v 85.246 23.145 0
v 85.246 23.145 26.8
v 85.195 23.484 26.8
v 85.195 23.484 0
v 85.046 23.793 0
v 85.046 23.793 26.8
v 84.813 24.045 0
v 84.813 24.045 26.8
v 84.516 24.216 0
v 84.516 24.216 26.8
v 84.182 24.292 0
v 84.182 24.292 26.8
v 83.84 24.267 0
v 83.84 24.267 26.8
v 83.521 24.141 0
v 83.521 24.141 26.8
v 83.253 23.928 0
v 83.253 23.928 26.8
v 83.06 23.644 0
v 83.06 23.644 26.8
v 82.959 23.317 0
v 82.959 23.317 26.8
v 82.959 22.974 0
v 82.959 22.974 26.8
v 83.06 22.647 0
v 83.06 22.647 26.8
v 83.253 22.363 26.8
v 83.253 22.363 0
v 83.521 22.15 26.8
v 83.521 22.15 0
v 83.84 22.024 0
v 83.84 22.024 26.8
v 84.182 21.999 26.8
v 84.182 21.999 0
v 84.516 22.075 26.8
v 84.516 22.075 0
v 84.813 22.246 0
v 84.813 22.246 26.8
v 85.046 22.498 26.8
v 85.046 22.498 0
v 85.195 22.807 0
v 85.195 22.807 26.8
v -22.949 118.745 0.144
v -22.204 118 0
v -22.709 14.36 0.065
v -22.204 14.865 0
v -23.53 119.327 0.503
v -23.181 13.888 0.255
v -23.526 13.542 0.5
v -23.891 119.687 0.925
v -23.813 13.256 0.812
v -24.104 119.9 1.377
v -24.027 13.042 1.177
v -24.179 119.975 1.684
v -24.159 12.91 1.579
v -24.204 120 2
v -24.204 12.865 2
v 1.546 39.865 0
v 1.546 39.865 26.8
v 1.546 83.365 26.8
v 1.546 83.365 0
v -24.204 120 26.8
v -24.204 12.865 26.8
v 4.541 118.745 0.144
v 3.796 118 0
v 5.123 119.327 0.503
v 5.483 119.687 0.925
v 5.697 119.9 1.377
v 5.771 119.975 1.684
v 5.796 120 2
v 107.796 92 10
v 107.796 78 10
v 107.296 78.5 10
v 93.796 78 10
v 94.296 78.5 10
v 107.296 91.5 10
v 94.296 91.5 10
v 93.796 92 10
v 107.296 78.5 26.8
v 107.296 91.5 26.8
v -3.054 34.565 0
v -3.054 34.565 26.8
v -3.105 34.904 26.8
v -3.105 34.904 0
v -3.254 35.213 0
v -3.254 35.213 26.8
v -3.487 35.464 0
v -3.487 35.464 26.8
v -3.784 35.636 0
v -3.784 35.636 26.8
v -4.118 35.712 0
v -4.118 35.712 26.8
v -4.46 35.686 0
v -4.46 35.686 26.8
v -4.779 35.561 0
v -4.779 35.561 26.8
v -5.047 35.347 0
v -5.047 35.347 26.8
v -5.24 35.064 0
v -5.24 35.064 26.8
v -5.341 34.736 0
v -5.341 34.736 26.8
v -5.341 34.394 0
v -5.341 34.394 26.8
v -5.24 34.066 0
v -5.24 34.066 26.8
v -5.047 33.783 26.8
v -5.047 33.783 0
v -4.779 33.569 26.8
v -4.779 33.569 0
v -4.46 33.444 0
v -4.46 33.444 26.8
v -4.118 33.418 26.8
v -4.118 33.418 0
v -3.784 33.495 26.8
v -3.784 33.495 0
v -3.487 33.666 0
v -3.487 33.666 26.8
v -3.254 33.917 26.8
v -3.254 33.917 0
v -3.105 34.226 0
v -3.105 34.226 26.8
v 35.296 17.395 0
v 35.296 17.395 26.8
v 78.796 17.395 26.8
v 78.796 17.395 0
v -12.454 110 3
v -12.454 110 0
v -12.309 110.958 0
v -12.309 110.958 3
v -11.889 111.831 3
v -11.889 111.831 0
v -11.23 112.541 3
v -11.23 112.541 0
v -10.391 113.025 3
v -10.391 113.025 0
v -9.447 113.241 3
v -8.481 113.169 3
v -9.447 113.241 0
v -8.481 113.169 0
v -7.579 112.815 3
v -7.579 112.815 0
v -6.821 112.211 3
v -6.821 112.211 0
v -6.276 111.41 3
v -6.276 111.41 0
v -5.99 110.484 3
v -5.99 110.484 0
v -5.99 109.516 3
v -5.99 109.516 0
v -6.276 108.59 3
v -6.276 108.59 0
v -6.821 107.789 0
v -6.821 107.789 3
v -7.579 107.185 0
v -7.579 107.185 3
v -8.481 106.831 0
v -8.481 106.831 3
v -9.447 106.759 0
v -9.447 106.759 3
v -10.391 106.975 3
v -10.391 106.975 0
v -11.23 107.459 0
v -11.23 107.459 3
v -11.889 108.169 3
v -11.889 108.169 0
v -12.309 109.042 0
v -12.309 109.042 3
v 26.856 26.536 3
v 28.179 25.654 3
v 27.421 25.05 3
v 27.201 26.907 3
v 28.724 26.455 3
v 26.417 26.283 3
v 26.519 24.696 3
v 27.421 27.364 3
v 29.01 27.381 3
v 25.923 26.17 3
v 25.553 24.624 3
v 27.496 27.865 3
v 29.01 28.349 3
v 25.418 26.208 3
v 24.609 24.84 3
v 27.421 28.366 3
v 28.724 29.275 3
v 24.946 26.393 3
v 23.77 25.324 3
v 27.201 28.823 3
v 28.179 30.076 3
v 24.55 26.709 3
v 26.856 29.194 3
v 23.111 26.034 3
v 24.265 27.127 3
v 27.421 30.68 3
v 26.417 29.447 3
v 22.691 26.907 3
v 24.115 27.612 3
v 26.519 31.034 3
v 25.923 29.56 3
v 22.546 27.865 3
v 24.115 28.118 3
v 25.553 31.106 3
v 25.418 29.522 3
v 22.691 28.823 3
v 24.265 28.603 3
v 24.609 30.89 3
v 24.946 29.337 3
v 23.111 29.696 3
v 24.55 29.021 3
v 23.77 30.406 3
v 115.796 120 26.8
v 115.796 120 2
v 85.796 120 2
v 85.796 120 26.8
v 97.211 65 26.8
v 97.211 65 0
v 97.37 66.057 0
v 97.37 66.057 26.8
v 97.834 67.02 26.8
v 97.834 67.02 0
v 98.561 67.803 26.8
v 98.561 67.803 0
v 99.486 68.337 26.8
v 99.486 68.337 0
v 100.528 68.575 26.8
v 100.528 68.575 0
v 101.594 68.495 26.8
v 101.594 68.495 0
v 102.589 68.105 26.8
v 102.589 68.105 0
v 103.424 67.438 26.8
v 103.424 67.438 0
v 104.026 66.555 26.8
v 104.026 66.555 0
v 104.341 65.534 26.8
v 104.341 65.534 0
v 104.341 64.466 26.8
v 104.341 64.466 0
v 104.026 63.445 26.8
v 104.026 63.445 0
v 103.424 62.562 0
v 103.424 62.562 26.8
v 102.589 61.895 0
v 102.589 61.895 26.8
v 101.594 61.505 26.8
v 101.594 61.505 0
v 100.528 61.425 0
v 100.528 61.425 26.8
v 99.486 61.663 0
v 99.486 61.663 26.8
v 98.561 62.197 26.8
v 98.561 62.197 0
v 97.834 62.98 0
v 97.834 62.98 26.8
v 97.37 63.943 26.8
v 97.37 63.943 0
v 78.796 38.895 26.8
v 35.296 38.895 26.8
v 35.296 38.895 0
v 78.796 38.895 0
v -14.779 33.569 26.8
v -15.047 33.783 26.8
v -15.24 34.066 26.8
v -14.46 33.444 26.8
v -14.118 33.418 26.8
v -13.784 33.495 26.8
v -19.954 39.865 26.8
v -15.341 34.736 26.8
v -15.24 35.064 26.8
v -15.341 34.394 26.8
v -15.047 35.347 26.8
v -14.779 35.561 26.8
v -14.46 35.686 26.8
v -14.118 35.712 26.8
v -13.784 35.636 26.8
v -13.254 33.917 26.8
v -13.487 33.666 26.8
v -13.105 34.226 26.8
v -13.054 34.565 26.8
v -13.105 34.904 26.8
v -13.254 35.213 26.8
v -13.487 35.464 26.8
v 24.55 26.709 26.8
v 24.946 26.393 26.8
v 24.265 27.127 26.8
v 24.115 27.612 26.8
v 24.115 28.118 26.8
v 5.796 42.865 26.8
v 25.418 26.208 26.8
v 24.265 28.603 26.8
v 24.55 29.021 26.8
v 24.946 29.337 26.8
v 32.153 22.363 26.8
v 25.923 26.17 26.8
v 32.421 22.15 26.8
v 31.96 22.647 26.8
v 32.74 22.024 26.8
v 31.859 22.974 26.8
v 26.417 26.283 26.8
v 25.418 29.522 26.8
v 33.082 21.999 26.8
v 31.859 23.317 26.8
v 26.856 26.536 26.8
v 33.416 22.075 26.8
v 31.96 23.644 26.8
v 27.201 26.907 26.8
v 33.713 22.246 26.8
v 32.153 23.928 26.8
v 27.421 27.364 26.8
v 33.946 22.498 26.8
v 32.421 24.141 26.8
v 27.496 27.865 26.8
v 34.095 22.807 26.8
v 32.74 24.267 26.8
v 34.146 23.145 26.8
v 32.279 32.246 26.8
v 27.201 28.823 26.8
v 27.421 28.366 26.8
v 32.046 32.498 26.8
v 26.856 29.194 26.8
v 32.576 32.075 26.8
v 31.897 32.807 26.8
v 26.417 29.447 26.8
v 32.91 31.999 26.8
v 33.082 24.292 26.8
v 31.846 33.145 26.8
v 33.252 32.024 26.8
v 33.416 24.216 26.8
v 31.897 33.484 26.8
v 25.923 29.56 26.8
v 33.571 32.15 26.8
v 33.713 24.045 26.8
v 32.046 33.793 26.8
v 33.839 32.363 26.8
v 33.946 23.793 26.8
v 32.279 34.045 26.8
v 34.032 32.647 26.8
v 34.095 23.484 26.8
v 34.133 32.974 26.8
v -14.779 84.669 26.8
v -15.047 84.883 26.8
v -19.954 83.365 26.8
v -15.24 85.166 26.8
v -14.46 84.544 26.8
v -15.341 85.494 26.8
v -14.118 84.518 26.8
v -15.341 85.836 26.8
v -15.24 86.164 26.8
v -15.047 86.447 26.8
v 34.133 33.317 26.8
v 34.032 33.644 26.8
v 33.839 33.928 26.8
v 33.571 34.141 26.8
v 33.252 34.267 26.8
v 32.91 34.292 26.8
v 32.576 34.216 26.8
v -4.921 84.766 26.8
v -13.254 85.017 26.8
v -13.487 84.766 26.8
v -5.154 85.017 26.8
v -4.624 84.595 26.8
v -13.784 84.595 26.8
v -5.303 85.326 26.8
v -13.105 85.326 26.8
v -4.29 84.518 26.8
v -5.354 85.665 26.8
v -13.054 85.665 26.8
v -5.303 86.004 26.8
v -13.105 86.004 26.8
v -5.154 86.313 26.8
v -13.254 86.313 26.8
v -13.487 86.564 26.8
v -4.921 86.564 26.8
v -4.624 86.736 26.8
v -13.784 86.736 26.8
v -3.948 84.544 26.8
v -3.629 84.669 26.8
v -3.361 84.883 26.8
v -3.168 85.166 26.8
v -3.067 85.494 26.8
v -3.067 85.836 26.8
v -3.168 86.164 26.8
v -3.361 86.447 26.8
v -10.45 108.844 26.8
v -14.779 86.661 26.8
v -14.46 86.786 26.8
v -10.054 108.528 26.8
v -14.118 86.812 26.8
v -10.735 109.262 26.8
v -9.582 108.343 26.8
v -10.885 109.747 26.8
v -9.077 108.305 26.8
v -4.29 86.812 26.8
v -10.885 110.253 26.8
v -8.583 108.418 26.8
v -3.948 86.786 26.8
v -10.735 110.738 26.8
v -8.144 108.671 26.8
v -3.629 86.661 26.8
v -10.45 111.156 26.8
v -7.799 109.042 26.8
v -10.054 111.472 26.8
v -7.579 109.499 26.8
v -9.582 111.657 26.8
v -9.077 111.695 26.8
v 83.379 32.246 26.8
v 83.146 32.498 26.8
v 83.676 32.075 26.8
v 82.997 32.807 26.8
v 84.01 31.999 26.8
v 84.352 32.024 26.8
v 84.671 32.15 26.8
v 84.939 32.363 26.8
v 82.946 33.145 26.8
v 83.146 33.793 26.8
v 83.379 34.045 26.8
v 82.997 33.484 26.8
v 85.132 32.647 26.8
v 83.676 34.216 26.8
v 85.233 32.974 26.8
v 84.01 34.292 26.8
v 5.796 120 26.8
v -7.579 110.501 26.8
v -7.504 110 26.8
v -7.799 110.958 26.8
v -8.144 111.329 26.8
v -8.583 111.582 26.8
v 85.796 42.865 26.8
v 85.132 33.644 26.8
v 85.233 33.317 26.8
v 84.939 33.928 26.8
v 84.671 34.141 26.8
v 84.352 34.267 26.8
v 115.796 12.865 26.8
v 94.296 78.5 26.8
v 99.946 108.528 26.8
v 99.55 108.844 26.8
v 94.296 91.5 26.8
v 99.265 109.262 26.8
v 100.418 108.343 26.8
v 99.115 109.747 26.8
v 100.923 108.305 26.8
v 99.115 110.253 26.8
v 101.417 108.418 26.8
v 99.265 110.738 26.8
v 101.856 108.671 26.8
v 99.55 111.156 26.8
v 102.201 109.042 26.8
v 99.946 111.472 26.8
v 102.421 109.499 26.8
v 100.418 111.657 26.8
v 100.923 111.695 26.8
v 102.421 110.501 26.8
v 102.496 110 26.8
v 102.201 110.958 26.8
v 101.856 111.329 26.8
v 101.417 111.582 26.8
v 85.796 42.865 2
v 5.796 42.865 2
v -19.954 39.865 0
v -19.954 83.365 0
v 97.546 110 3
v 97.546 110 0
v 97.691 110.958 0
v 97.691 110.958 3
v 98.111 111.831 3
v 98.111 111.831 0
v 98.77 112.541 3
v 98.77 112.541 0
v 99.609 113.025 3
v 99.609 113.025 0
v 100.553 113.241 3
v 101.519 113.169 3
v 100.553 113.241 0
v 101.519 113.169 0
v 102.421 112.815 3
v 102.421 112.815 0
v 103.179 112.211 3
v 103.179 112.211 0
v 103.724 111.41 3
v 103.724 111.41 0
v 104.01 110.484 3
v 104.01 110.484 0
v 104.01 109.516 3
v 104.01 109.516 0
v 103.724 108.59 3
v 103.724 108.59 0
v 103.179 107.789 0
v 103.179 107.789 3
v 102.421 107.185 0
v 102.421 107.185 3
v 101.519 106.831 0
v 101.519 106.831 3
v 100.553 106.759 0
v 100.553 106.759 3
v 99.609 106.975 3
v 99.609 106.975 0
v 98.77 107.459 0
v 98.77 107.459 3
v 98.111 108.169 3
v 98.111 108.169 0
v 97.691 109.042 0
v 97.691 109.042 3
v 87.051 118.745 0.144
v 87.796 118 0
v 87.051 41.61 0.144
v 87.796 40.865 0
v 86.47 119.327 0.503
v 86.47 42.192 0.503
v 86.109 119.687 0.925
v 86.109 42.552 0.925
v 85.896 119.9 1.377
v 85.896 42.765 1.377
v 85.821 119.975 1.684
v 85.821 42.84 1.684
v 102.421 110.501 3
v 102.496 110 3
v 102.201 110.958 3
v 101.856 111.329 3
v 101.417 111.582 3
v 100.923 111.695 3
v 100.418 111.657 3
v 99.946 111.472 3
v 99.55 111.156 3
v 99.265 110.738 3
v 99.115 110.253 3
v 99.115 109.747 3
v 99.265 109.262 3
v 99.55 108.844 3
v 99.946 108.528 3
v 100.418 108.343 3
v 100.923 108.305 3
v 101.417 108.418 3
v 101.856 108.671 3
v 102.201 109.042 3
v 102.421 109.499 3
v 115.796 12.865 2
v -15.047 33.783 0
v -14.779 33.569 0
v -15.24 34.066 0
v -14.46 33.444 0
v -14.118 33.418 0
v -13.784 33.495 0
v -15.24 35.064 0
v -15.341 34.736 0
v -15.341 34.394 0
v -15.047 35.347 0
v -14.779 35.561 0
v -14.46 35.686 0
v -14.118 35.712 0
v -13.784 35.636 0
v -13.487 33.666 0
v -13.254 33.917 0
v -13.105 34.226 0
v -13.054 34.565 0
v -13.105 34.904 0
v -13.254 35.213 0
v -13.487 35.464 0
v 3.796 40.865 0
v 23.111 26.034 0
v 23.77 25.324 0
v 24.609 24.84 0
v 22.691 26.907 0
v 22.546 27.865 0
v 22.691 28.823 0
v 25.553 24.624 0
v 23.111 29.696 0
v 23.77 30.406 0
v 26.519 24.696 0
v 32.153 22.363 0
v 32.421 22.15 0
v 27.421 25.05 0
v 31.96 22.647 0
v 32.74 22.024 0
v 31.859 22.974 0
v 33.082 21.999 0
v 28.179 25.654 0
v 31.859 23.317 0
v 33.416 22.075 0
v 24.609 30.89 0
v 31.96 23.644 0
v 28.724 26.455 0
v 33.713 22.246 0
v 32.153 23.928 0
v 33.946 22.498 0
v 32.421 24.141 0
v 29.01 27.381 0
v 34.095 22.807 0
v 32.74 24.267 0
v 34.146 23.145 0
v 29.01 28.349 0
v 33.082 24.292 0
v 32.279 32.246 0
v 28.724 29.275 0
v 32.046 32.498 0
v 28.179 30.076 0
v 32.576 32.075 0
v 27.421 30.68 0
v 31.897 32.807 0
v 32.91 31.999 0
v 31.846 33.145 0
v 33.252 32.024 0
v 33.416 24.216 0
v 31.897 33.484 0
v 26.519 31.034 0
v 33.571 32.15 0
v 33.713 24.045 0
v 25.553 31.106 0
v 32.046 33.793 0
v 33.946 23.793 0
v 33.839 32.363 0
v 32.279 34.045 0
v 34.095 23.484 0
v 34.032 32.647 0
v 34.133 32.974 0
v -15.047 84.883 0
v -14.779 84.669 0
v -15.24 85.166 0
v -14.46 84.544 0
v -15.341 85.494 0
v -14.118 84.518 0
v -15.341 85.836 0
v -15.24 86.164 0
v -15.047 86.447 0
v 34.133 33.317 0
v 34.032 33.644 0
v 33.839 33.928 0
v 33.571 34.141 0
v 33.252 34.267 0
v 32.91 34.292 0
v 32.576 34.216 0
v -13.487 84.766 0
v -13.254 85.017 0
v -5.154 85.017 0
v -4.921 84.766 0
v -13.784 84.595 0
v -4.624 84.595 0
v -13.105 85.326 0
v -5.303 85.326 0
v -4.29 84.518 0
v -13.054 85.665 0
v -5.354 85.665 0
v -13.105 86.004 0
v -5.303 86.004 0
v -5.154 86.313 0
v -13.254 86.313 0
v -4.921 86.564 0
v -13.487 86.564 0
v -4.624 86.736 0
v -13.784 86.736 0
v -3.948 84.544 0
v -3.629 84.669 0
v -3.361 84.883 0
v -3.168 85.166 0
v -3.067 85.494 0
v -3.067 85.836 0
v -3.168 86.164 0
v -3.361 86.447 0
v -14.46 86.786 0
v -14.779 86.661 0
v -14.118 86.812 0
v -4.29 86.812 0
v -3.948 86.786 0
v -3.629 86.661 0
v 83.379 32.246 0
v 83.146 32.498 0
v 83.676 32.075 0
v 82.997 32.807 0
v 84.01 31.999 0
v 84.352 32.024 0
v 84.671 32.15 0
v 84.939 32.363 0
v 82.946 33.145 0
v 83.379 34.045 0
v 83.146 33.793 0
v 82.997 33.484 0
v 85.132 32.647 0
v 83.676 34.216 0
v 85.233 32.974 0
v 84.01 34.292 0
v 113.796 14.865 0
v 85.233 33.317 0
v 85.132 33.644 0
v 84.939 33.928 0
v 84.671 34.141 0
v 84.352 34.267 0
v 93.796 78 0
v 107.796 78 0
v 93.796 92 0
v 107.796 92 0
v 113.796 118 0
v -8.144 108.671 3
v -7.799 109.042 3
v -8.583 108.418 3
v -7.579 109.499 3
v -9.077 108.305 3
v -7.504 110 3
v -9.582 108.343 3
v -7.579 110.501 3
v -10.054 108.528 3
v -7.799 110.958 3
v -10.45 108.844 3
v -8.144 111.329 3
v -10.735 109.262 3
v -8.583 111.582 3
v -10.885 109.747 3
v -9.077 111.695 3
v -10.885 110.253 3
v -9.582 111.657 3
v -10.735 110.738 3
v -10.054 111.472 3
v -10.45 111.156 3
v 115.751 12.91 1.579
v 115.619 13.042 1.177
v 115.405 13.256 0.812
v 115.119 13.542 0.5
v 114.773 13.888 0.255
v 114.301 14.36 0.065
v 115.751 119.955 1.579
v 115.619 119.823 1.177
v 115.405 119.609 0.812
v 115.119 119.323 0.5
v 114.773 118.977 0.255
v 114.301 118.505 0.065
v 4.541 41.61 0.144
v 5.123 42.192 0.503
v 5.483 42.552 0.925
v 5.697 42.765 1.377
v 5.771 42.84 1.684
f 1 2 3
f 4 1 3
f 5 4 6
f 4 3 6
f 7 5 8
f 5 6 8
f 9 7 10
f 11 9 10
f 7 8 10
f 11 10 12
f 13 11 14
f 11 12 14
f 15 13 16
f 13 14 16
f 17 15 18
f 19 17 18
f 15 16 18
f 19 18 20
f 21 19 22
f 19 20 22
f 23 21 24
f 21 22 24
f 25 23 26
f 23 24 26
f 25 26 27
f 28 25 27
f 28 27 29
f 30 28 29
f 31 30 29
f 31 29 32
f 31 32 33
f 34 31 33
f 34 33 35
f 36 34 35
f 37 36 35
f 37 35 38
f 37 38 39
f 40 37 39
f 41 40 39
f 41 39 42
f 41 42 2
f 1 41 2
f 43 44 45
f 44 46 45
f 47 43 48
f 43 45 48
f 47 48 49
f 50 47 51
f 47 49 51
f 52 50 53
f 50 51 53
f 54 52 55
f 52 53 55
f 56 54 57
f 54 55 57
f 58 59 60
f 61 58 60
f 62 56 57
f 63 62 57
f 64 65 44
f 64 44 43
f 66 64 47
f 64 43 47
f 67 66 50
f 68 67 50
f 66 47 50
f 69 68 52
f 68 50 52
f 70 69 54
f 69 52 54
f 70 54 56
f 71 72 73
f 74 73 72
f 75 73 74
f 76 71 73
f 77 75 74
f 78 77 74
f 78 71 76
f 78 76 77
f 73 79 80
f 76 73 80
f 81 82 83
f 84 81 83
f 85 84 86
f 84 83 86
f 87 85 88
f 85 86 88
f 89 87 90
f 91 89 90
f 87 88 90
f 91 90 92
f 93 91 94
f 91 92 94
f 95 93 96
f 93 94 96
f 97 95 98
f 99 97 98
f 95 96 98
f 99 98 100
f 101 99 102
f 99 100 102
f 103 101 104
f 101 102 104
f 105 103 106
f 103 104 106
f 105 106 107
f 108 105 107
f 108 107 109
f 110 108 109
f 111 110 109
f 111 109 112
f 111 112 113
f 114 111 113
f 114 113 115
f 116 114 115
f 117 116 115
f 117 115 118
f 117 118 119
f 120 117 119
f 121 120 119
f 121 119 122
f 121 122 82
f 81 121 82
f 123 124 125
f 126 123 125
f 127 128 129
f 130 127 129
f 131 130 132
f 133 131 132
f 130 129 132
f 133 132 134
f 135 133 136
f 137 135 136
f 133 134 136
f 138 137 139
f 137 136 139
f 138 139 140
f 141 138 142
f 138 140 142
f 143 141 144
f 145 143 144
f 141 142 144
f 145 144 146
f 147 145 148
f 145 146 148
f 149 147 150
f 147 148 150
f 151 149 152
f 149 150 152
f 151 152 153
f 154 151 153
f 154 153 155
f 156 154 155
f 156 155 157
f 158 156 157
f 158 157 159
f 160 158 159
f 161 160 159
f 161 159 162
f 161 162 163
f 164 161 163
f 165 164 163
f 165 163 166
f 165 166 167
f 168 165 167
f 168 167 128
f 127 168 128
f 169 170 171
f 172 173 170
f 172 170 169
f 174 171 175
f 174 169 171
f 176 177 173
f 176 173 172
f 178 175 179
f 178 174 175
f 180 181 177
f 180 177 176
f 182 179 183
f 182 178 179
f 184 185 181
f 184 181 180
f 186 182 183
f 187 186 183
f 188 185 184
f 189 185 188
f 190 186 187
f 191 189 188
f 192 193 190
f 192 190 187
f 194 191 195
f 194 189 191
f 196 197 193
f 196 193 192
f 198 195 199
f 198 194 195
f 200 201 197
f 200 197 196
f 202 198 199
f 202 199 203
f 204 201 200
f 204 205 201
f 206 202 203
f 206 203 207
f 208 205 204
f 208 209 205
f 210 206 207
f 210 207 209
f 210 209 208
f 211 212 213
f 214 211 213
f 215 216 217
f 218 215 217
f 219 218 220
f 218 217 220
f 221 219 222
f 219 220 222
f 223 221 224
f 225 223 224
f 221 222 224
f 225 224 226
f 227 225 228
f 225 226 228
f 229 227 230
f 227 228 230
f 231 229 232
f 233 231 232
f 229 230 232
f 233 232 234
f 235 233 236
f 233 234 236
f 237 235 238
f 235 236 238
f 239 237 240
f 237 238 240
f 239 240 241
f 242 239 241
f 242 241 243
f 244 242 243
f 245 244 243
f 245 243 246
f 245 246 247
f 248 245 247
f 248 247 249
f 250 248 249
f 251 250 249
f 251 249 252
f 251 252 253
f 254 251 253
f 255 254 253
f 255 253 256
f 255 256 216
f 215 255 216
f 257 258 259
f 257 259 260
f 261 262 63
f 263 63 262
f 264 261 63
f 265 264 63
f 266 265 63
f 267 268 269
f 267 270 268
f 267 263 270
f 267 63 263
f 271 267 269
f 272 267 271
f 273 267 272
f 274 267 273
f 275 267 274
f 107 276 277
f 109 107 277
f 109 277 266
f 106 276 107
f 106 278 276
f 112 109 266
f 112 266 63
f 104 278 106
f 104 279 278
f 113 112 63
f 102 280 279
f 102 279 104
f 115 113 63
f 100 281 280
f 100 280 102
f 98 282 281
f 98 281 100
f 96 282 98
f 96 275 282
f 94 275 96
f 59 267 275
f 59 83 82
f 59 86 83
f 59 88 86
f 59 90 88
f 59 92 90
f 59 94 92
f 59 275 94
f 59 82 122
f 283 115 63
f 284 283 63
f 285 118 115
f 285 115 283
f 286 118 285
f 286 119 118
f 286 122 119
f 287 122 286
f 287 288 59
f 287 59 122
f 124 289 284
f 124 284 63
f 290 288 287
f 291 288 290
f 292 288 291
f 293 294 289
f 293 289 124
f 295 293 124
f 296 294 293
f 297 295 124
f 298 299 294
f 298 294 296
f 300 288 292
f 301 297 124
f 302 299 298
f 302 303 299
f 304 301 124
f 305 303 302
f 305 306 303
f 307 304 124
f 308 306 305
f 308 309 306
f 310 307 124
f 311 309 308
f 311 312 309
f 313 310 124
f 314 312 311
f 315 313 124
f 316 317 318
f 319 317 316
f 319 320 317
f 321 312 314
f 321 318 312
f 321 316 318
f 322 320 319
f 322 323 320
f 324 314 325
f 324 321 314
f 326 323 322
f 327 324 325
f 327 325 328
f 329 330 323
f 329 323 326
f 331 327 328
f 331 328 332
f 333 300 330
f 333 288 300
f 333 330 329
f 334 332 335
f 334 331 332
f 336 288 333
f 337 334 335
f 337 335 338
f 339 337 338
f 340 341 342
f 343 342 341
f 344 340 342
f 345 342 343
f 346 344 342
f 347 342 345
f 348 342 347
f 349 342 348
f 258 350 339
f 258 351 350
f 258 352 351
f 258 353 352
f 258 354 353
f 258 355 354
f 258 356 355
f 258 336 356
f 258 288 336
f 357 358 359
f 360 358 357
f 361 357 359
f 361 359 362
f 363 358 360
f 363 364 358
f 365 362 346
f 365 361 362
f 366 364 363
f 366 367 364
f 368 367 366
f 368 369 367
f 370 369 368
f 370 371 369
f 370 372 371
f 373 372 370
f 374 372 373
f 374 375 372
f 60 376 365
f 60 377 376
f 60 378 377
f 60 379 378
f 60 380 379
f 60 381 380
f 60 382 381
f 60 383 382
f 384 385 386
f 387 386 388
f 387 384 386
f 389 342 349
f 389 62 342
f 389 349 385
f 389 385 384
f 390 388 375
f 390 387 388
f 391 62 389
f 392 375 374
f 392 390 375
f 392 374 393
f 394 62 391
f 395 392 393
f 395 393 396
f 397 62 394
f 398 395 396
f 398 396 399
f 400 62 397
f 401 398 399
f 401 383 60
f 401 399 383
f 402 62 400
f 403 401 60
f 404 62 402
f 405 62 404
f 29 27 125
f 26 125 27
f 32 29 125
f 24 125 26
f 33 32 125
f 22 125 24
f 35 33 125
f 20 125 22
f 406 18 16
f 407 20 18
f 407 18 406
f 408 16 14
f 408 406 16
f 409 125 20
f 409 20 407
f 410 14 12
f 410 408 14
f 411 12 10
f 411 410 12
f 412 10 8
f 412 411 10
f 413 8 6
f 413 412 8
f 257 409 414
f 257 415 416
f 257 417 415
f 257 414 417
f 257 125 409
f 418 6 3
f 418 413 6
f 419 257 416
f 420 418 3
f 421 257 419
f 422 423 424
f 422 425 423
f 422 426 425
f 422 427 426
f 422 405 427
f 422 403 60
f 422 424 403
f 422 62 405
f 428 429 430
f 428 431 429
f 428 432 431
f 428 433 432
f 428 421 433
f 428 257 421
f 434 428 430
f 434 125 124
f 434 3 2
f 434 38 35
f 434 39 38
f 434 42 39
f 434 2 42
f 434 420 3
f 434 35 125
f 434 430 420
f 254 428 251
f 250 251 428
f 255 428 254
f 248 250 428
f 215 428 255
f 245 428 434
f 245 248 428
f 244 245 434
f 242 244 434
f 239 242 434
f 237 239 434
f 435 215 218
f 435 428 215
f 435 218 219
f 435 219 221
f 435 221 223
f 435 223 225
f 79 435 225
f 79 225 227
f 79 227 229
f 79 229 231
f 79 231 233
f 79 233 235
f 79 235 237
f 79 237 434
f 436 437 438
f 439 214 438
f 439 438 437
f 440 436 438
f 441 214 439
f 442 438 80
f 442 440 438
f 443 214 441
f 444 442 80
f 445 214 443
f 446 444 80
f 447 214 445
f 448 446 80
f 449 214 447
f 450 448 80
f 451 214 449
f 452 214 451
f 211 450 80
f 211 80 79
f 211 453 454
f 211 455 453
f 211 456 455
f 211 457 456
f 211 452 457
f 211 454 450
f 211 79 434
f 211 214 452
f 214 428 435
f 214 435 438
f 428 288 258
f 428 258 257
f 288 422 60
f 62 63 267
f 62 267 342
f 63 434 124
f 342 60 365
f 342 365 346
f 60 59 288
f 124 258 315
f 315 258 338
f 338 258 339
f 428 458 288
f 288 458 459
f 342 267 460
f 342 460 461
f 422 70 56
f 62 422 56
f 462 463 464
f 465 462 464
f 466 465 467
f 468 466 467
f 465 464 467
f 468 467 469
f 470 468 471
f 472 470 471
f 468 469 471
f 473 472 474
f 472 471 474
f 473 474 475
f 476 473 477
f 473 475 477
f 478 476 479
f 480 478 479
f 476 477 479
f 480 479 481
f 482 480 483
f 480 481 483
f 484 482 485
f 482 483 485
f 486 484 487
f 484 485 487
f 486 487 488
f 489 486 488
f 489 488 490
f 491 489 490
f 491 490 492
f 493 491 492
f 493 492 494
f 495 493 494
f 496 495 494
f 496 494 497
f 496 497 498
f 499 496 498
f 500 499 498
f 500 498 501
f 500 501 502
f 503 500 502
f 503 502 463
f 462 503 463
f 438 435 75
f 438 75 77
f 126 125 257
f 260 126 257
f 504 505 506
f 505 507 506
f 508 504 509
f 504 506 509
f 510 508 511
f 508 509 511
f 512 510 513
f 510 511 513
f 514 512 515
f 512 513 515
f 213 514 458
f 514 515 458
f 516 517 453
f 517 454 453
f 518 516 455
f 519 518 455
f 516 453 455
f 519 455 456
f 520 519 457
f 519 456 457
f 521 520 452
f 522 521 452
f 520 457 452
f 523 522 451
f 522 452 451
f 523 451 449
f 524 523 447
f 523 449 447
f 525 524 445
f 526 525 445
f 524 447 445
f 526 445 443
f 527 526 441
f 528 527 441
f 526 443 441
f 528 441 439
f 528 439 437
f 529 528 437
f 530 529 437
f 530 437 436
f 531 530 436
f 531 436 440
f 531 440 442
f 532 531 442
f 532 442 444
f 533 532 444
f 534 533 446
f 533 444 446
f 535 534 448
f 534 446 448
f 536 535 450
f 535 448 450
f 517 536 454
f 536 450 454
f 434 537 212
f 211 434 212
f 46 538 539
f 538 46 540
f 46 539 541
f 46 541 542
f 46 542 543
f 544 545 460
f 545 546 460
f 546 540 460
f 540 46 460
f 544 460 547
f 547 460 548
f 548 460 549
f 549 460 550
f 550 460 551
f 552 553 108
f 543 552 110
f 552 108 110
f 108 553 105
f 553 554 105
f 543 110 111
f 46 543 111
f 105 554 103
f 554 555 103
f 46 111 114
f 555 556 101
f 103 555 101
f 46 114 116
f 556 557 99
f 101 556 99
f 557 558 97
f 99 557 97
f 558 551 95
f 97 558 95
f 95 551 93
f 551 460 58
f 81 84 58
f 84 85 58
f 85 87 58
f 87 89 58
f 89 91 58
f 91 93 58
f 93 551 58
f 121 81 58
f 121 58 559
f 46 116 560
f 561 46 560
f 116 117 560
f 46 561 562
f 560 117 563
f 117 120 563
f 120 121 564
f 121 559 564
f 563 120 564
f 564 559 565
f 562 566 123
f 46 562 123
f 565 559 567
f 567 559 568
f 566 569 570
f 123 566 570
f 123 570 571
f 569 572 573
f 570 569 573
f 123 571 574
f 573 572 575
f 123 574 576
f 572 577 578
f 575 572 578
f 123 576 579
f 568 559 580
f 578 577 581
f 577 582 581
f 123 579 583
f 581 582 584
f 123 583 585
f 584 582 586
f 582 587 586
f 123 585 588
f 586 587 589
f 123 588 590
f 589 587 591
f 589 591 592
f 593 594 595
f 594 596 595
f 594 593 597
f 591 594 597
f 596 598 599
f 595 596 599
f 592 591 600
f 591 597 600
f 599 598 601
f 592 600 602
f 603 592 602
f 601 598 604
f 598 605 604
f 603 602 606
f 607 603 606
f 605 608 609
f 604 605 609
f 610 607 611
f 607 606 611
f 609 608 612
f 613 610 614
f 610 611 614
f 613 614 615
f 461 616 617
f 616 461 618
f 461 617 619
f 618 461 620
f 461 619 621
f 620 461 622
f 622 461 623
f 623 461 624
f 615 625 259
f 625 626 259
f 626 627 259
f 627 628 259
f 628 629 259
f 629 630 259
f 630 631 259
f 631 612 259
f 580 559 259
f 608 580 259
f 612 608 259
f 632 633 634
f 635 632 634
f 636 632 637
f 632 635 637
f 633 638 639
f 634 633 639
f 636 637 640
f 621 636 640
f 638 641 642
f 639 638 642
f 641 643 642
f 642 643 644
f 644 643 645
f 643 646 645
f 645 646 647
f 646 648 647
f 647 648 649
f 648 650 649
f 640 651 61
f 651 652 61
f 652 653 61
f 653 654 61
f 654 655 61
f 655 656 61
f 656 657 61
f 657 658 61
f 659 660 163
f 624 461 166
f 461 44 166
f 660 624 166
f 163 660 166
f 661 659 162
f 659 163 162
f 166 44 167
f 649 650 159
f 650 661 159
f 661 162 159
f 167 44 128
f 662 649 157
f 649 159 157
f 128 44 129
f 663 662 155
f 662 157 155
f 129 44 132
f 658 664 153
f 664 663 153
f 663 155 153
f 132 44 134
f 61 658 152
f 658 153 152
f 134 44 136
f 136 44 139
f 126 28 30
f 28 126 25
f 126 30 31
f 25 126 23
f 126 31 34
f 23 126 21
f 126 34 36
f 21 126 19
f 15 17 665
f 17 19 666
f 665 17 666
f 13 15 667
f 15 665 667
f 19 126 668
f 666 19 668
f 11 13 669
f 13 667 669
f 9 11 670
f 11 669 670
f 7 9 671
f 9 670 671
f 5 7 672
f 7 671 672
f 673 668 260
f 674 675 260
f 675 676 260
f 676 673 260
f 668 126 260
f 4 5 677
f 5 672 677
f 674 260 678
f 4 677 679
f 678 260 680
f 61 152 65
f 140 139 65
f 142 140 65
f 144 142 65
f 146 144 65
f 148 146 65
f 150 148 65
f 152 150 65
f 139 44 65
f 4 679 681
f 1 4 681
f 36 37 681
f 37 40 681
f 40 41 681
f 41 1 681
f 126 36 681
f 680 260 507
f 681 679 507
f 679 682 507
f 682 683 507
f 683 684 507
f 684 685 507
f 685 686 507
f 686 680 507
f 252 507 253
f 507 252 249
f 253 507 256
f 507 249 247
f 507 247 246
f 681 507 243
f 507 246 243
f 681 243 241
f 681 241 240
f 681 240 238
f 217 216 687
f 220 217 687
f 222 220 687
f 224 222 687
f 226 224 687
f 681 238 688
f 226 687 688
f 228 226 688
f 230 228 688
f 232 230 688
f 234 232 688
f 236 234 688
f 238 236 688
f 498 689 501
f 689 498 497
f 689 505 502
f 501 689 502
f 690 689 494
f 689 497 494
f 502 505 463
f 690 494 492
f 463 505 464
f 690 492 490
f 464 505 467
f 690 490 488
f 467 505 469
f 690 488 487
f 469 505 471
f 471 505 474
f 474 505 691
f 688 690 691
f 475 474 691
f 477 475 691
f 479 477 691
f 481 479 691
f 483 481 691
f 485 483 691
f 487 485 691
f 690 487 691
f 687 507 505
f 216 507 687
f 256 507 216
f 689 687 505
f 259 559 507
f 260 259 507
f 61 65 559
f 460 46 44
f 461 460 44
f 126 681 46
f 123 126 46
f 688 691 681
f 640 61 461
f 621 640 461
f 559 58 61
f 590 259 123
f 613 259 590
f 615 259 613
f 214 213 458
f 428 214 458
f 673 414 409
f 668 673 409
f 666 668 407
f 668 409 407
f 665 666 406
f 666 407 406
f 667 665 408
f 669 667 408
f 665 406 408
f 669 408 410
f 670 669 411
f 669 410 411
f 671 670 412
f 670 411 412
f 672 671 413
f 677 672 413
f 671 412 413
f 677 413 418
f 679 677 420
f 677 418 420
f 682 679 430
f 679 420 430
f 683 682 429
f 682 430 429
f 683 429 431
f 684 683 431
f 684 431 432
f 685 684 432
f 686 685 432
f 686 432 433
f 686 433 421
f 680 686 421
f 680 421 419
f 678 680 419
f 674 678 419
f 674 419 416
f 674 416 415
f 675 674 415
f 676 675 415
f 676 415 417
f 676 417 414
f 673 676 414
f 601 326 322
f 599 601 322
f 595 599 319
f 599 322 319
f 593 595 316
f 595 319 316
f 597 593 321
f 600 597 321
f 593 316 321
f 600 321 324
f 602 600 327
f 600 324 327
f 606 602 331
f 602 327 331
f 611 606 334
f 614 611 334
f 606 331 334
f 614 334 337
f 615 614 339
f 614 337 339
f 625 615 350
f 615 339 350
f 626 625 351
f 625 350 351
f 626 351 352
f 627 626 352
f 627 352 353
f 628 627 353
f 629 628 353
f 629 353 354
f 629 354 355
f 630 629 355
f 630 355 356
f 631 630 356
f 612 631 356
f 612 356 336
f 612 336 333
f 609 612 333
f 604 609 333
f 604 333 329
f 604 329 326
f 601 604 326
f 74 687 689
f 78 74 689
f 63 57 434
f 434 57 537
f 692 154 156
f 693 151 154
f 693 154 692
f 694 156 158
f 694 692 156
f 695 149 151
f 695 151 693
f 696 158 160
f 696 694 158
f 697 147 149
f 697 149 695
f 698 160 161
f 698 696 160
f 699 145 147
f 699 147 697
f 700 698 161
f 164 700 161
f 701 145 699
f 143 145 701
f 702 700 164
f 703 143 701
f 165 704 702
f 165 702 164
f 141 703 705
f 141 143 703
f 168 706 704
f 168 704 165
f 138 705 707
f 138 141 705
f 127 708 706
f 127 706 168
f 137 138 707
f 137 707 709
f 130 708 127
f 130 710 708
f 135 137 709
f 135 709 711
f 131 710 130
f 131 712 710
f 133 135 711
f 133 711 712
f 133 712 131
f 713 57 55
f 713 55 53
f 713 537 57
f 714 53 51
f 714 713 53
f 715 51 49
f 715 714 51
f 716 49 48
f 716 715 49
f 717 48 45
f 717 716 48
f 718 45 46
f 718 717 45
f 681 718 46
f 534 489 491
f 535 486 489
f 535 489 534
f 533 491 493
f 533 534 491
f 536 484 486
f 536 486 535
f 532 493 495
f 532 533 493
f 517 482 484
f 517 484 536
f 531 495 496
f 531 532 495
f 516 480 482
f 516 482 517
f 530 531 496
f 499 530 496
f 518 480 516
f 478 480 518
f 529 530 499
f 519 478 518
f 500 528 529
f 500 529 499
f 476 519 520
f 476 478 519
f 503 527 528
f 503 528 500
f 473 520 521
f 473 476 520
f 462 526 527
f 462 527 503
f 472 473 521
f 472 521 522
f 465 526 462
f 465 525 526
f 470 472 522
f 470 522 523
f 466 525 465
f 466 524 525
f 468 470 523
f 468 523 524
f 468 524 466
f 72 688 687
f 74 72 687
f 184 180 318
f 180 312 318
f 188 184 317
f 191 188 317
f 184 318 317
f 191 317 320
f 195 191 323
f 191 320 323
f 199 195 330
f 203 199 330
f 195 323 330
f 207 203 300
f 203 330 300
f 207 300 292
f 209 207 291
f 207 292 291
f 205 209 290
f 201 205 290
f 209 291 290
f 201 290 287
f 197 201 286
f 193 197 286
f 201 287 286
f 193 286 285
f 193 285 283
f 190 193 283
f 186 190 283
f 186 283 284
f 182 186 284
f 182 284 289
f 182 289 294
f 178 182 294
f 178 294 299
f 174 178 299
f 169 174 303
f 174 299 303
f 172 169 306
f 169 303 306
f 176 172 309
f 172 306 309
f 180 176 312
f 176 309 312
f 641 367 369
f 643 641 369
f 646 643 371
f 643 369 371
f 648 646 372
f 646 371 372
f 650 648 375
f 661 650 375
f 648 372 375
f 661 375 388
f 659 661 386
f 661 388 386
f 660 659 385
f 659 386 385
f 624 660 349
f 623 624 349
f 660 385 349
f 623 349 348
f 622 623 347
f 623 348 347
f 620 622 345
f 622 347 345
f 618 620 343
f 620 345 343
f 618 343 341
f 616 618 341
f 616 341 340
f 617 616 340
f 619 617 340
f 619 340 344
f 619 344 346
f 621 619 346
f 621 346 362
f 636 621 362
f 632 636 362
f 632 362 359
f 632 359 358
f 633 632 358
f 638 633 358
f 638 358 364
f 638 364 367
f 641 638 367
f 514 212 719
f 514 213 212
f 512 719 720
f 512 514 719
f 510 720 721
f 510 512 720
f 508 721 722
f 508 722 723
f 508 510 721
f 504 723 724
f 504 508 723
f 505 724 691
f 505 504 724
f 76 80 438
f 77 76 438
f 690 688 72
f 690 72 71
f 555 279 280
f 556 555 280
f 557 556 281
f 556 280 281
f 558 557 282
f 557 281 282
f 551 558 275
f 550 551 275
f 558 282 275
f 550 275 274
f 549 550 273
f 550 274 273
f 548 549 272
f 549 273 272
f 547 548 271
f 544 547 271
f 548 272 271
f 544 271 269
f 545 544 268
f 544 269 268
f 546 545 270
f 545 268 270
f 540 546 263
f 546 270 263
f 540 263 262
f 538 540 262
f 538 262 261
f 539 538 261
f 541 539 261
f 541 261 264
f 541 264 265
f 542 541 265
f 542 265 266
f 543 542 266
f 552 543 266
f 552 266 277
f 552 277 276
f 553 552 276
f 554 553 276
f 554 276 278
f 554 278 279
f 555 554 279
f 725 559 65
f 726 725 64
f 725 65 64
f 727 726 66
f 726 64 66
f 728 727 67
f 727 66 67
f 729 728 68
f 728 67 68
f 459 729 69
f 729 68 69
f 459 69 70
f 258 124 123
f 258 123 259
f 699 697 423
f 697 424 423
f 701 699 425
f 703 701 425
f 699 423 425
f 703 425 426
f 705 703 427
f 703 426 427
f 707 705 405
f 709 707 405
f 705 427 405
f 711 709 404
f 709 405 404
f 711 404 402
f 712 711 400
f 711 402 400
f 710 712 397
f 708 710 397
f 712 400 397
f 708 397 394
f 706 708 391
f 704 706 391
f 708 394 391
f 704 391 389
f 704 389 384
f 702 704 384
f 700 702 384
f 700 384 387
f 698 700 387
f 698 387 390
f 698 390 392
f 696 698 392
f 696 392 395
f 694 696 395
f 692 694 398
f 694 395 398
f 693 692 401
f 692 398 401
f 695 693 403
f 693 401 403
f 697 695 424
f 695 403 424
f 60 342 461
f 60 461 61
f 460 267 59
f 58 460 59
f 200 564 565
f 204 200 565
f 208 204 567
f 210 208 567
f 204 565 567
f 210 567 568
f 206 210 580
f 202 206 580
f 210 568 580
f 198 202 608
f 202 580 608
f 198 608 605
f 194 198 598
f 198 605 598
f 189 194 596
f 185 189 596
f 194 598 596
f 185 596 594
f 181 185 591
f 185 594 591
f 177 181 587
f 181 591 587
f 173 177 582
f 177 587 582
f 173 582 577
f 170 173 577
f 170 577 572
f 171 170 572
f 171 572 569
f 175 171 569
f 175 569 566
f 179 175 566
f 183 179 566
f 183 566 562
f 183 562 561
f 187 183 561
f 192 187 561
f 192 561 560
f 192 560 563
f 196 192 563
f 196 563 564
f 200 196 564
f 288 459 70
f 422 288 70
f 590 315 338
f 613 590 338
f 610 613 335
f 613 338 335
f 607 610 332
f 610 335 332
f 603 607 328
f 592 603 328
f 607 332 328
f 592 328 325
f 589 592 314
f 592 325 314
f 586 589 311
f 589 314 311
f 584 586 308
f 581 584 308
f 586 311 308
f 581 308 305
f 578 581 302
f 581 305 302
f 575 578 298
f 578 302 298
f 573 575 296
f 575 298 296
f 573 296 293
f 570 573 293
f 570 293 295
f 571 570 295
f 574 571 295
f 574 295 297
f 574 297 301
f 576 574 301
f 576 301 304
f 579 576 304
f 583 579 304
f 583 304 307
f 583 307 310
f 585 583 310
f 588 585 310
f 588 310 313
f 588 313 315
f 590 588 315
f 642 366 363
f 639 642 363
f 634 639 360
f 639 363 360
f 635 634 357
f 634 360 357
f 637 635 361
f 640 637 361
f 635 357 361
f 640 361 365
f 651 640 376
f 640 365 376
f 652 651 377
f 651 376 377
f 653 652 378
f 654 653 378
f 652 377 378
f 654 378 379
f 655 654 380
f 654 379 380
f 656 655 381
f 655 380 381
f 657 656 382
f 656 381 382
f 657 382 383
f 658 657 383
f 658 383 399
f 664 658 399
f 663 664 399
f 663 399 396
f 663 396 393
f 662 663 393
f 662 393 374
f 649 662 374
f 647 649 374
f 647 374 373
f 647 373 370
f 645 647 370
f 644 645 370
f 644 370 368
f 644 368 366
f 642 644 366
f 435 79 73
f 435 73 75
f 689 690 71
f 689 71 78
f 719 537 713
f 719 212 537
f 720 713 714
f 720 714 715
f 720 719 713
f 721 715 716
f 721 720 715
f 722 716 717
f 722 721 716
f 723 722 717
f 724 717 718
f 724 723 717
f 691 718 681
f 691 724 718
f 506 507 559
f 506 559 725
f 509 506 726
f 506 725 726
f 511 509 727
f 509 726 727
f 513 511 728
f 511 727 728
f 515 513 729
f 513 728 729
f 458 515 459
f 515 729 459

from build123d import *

# Parameters (mm, degrees)
BOSS_EXTRUDE1_DEPTH            = 26.8
SKETCH2_W                      = 21.5
SKETCH2_H                      = 43.5
SKETCH2_W_2                    = 43.5
SKETCH2_H_2                    = 21.5
CUT_EXTRUDE1_DEPTH             = 169.899357105
SKETCH3_R                      = 1.15
BOSS_EXTRUDE2_DEPTH            = 26.8
SKETCH3_2_R                    = 1.15
CUT_EXTRUDE2_DEPTH             = 169.899357105
SKETCH4_R                      = 1.15
CUT_EXTRUDE3_DEPTH             = 169.899357105
FILLET2_R                      = 2
CBORE_FOR_M3_SHCS1_D           = 3.4
CBORE_FOR_M3_SHCS1_CBORE_D     = 6.5
CBORE_FOR_M3_SHCS1_CBORE_DEPTH = 3
SKETCH12_W                     = 14
SKETCH12_H                     = 14
CUT_EXTRUDE5_DEPTH             = 10
SKETCH13_W                     = 13
SKETCH13_H                     = 13
CUT_EXTRUDE6_DEPTH             = 168.603677855
SKETCH14_R                     = 3.585
CUT_EXTRUDE7_DEPTH             = 169.899357105


with BuildPart() as part:
    # Sketch1 → Boss-Extrude1 (new body)
    with BuildSketch(Plane.XY):
        Polygon((85.79616933, 12.865007186), (115.79616933, 12.865007186), (115.79616933, 119.999999996), (85.79616933, 119.999999996), (85.79616933, 42.865007186), (5.79616933, 42.865007186), (5.79616933, 119.999999996), (-24.20383067, 119.999999996), (-24.20383067, 12.865007186), (5.79616933, 12.865007186), align=None)
    extrude(amount=BOSS_EXTRUDE1_DEPTH)

    # Sketch2 → Cut-Extrude1 (cut, through all)
    with BuildSketch(Plane.XY.offset(26.8)):
        with Locations((-9.20383067, 61.615007186)):
            Rectangle(SKETCH2_W, SKETCH2_H)
        with Locations((57.04616933, 28.145492547)):
            Rectangle(SKETCH2_W_2, SKETCH2_H_2)
    extrude(amount=-CUT_EXTRUDE1_DEPTH, mode=Mode.SUBTRACT)

    # Sketch3 → Boss-Extrude2 (add, through all)
    with BuildSketch(Plane.XY.offset(26.8)):
        with Locations((-14.20383067, 34.565007186)):
            Circle(SKETCH3_R)
        with Locations((-4.20383067, 34.565007186)):
            Circle(SKETCH3_R)
        with Locations((-14.20383067, 85.665007186)):
            Circle(SKETCH3_R)
        with Locations((-4.20383067, 85.665007186)):
            Circle(SKETCH3_R)
    extrude(amount=-BOSS_EXTRUDE2_DEPTH)

    # Sketch3<2> → Cut-Extrude2 (cut, through all)
    with BuildSketch(Plane.XY.offset(26.8)):
        with Locations((-14.20383067, 34.565007186)):
            Circle(SKETCH3_2_R)
        with Locations((-4.20383067, 34.565007186)):
            Circle(SKETCH3_2_R)
        with Locations((-14.20383067, 85.665007186)):
            Circle(SKETCH3_2_R)
        with Locations(Location((-4.20383067, 85.665007186, 0), (0, 0, 180))):
            Circle(SKETCH3_2_R)
    extrude(amount=-CUT_EXTRUDE2_DEPTH, mode=Mode.SUBTRACT)

    # Sketch4 → Cut-Extrude3 (cut, through all)
    with BuildSketch(Plane.XY.offset(26.8)):
        with Locations((84.09616933, 23.145492547)):
            Circle(SKETCH4_R)
        with Locations(Location((84.09616933, 33.145492547, 0), (0, 0, 180))):
            Circle(SKETCH4_R)
        with Locations((32.99616933, 23.145492547)):
            Circle(SKETCH4_R)
        with Locations(Location((32.99616933, 33.145492547, 0), (0, 0, 180))):
            Circle(SKETCH4_R)
    extrude(amount=-CUT_EXTRUDE3_DEPTH, mode=Mode.SUBTRACT)

    # Fillet2
    fillet2_edges = [part.edges().sort_by_distance(p)[0] for p in [
        (85.79616933, 81.432503591, 0),
        (100.79616933, 119.999999996, 0),
        (115.79616933, 66.432503591, 0),
        (45.79616933, 12.865007186, 0),
        (-24.20383067, 66.432503591, 0),
        (-9.20383067, 119.999999996, 0),
        (5.79616933, 81.432503591, 0),
        (45.79616933, 42.865007186, 0),
    ]]
    fillet(fillet2_edges, radius=FILLET2_R)

    # CBORE for M3 SHCS1 (through all)
    with Locations(Plane(origin=(0, 0, 0), x_dir=(-1, 0, 0), z_dir=(0, 0, -1))):
        with Locations((-25.79616933, 27.865007186), (9.20383067, 109.999999996), (-100.79616933, 109.999999996)):
            CounterBoreHole(CBORE_FOR_M3_SHCS1_D / 2, CBORE_FOR_M3_SHCS1_CBORE_D / 2, CBORE_FOR_M3_SHCS1_CBORE_DEPTH)

    # Sketch12 → Cut-Extrude5 (cut)
    with BuildSketch(Plane(origin=(0, 0, 0), x_dir=(-1, 0, 0), z_dir=(0, 0, -1))):
        with Locations((-100.79616933, 84.999999996)):
            Rectangle(SKETCH12_W, SKETCH12_H)
    extrude(amount=-CUT_EXTRUDE5_DEPTH, mode=Mode.SUBTRACT)

    # Sketch13 → Cut-Extrude6 (cut, through all)
    with BuildSketch(Plane(origin=(0, 0, 10), x_dir=(-1, 0, 0), z_dir=(0, 0, -1))):
        with Locations((-100.79616933, 84.999999996)):
            Rectangle(SKETCH13_W, SKETCH13_H)
    extrude(amount=-CUT_EXTRUDE6_DEPTH, mode=Mode.SUBTRACT)

    # Sketch14 → Cut-Extrude7 (cut, through all)
    with BuildSketch(Plane(origin=(0, 0, 0), x_dir=(-1, 0, 0), z_dir=(0, 0, -1))):
        with Locations((-100.79616933, 64.999999996)):
            Circle(SKETCH14_R)
    extrude(amount=-CUT_EXTRUDE7_DEPTH, mode=Mode.SUBTRACT)


solid = part.part
